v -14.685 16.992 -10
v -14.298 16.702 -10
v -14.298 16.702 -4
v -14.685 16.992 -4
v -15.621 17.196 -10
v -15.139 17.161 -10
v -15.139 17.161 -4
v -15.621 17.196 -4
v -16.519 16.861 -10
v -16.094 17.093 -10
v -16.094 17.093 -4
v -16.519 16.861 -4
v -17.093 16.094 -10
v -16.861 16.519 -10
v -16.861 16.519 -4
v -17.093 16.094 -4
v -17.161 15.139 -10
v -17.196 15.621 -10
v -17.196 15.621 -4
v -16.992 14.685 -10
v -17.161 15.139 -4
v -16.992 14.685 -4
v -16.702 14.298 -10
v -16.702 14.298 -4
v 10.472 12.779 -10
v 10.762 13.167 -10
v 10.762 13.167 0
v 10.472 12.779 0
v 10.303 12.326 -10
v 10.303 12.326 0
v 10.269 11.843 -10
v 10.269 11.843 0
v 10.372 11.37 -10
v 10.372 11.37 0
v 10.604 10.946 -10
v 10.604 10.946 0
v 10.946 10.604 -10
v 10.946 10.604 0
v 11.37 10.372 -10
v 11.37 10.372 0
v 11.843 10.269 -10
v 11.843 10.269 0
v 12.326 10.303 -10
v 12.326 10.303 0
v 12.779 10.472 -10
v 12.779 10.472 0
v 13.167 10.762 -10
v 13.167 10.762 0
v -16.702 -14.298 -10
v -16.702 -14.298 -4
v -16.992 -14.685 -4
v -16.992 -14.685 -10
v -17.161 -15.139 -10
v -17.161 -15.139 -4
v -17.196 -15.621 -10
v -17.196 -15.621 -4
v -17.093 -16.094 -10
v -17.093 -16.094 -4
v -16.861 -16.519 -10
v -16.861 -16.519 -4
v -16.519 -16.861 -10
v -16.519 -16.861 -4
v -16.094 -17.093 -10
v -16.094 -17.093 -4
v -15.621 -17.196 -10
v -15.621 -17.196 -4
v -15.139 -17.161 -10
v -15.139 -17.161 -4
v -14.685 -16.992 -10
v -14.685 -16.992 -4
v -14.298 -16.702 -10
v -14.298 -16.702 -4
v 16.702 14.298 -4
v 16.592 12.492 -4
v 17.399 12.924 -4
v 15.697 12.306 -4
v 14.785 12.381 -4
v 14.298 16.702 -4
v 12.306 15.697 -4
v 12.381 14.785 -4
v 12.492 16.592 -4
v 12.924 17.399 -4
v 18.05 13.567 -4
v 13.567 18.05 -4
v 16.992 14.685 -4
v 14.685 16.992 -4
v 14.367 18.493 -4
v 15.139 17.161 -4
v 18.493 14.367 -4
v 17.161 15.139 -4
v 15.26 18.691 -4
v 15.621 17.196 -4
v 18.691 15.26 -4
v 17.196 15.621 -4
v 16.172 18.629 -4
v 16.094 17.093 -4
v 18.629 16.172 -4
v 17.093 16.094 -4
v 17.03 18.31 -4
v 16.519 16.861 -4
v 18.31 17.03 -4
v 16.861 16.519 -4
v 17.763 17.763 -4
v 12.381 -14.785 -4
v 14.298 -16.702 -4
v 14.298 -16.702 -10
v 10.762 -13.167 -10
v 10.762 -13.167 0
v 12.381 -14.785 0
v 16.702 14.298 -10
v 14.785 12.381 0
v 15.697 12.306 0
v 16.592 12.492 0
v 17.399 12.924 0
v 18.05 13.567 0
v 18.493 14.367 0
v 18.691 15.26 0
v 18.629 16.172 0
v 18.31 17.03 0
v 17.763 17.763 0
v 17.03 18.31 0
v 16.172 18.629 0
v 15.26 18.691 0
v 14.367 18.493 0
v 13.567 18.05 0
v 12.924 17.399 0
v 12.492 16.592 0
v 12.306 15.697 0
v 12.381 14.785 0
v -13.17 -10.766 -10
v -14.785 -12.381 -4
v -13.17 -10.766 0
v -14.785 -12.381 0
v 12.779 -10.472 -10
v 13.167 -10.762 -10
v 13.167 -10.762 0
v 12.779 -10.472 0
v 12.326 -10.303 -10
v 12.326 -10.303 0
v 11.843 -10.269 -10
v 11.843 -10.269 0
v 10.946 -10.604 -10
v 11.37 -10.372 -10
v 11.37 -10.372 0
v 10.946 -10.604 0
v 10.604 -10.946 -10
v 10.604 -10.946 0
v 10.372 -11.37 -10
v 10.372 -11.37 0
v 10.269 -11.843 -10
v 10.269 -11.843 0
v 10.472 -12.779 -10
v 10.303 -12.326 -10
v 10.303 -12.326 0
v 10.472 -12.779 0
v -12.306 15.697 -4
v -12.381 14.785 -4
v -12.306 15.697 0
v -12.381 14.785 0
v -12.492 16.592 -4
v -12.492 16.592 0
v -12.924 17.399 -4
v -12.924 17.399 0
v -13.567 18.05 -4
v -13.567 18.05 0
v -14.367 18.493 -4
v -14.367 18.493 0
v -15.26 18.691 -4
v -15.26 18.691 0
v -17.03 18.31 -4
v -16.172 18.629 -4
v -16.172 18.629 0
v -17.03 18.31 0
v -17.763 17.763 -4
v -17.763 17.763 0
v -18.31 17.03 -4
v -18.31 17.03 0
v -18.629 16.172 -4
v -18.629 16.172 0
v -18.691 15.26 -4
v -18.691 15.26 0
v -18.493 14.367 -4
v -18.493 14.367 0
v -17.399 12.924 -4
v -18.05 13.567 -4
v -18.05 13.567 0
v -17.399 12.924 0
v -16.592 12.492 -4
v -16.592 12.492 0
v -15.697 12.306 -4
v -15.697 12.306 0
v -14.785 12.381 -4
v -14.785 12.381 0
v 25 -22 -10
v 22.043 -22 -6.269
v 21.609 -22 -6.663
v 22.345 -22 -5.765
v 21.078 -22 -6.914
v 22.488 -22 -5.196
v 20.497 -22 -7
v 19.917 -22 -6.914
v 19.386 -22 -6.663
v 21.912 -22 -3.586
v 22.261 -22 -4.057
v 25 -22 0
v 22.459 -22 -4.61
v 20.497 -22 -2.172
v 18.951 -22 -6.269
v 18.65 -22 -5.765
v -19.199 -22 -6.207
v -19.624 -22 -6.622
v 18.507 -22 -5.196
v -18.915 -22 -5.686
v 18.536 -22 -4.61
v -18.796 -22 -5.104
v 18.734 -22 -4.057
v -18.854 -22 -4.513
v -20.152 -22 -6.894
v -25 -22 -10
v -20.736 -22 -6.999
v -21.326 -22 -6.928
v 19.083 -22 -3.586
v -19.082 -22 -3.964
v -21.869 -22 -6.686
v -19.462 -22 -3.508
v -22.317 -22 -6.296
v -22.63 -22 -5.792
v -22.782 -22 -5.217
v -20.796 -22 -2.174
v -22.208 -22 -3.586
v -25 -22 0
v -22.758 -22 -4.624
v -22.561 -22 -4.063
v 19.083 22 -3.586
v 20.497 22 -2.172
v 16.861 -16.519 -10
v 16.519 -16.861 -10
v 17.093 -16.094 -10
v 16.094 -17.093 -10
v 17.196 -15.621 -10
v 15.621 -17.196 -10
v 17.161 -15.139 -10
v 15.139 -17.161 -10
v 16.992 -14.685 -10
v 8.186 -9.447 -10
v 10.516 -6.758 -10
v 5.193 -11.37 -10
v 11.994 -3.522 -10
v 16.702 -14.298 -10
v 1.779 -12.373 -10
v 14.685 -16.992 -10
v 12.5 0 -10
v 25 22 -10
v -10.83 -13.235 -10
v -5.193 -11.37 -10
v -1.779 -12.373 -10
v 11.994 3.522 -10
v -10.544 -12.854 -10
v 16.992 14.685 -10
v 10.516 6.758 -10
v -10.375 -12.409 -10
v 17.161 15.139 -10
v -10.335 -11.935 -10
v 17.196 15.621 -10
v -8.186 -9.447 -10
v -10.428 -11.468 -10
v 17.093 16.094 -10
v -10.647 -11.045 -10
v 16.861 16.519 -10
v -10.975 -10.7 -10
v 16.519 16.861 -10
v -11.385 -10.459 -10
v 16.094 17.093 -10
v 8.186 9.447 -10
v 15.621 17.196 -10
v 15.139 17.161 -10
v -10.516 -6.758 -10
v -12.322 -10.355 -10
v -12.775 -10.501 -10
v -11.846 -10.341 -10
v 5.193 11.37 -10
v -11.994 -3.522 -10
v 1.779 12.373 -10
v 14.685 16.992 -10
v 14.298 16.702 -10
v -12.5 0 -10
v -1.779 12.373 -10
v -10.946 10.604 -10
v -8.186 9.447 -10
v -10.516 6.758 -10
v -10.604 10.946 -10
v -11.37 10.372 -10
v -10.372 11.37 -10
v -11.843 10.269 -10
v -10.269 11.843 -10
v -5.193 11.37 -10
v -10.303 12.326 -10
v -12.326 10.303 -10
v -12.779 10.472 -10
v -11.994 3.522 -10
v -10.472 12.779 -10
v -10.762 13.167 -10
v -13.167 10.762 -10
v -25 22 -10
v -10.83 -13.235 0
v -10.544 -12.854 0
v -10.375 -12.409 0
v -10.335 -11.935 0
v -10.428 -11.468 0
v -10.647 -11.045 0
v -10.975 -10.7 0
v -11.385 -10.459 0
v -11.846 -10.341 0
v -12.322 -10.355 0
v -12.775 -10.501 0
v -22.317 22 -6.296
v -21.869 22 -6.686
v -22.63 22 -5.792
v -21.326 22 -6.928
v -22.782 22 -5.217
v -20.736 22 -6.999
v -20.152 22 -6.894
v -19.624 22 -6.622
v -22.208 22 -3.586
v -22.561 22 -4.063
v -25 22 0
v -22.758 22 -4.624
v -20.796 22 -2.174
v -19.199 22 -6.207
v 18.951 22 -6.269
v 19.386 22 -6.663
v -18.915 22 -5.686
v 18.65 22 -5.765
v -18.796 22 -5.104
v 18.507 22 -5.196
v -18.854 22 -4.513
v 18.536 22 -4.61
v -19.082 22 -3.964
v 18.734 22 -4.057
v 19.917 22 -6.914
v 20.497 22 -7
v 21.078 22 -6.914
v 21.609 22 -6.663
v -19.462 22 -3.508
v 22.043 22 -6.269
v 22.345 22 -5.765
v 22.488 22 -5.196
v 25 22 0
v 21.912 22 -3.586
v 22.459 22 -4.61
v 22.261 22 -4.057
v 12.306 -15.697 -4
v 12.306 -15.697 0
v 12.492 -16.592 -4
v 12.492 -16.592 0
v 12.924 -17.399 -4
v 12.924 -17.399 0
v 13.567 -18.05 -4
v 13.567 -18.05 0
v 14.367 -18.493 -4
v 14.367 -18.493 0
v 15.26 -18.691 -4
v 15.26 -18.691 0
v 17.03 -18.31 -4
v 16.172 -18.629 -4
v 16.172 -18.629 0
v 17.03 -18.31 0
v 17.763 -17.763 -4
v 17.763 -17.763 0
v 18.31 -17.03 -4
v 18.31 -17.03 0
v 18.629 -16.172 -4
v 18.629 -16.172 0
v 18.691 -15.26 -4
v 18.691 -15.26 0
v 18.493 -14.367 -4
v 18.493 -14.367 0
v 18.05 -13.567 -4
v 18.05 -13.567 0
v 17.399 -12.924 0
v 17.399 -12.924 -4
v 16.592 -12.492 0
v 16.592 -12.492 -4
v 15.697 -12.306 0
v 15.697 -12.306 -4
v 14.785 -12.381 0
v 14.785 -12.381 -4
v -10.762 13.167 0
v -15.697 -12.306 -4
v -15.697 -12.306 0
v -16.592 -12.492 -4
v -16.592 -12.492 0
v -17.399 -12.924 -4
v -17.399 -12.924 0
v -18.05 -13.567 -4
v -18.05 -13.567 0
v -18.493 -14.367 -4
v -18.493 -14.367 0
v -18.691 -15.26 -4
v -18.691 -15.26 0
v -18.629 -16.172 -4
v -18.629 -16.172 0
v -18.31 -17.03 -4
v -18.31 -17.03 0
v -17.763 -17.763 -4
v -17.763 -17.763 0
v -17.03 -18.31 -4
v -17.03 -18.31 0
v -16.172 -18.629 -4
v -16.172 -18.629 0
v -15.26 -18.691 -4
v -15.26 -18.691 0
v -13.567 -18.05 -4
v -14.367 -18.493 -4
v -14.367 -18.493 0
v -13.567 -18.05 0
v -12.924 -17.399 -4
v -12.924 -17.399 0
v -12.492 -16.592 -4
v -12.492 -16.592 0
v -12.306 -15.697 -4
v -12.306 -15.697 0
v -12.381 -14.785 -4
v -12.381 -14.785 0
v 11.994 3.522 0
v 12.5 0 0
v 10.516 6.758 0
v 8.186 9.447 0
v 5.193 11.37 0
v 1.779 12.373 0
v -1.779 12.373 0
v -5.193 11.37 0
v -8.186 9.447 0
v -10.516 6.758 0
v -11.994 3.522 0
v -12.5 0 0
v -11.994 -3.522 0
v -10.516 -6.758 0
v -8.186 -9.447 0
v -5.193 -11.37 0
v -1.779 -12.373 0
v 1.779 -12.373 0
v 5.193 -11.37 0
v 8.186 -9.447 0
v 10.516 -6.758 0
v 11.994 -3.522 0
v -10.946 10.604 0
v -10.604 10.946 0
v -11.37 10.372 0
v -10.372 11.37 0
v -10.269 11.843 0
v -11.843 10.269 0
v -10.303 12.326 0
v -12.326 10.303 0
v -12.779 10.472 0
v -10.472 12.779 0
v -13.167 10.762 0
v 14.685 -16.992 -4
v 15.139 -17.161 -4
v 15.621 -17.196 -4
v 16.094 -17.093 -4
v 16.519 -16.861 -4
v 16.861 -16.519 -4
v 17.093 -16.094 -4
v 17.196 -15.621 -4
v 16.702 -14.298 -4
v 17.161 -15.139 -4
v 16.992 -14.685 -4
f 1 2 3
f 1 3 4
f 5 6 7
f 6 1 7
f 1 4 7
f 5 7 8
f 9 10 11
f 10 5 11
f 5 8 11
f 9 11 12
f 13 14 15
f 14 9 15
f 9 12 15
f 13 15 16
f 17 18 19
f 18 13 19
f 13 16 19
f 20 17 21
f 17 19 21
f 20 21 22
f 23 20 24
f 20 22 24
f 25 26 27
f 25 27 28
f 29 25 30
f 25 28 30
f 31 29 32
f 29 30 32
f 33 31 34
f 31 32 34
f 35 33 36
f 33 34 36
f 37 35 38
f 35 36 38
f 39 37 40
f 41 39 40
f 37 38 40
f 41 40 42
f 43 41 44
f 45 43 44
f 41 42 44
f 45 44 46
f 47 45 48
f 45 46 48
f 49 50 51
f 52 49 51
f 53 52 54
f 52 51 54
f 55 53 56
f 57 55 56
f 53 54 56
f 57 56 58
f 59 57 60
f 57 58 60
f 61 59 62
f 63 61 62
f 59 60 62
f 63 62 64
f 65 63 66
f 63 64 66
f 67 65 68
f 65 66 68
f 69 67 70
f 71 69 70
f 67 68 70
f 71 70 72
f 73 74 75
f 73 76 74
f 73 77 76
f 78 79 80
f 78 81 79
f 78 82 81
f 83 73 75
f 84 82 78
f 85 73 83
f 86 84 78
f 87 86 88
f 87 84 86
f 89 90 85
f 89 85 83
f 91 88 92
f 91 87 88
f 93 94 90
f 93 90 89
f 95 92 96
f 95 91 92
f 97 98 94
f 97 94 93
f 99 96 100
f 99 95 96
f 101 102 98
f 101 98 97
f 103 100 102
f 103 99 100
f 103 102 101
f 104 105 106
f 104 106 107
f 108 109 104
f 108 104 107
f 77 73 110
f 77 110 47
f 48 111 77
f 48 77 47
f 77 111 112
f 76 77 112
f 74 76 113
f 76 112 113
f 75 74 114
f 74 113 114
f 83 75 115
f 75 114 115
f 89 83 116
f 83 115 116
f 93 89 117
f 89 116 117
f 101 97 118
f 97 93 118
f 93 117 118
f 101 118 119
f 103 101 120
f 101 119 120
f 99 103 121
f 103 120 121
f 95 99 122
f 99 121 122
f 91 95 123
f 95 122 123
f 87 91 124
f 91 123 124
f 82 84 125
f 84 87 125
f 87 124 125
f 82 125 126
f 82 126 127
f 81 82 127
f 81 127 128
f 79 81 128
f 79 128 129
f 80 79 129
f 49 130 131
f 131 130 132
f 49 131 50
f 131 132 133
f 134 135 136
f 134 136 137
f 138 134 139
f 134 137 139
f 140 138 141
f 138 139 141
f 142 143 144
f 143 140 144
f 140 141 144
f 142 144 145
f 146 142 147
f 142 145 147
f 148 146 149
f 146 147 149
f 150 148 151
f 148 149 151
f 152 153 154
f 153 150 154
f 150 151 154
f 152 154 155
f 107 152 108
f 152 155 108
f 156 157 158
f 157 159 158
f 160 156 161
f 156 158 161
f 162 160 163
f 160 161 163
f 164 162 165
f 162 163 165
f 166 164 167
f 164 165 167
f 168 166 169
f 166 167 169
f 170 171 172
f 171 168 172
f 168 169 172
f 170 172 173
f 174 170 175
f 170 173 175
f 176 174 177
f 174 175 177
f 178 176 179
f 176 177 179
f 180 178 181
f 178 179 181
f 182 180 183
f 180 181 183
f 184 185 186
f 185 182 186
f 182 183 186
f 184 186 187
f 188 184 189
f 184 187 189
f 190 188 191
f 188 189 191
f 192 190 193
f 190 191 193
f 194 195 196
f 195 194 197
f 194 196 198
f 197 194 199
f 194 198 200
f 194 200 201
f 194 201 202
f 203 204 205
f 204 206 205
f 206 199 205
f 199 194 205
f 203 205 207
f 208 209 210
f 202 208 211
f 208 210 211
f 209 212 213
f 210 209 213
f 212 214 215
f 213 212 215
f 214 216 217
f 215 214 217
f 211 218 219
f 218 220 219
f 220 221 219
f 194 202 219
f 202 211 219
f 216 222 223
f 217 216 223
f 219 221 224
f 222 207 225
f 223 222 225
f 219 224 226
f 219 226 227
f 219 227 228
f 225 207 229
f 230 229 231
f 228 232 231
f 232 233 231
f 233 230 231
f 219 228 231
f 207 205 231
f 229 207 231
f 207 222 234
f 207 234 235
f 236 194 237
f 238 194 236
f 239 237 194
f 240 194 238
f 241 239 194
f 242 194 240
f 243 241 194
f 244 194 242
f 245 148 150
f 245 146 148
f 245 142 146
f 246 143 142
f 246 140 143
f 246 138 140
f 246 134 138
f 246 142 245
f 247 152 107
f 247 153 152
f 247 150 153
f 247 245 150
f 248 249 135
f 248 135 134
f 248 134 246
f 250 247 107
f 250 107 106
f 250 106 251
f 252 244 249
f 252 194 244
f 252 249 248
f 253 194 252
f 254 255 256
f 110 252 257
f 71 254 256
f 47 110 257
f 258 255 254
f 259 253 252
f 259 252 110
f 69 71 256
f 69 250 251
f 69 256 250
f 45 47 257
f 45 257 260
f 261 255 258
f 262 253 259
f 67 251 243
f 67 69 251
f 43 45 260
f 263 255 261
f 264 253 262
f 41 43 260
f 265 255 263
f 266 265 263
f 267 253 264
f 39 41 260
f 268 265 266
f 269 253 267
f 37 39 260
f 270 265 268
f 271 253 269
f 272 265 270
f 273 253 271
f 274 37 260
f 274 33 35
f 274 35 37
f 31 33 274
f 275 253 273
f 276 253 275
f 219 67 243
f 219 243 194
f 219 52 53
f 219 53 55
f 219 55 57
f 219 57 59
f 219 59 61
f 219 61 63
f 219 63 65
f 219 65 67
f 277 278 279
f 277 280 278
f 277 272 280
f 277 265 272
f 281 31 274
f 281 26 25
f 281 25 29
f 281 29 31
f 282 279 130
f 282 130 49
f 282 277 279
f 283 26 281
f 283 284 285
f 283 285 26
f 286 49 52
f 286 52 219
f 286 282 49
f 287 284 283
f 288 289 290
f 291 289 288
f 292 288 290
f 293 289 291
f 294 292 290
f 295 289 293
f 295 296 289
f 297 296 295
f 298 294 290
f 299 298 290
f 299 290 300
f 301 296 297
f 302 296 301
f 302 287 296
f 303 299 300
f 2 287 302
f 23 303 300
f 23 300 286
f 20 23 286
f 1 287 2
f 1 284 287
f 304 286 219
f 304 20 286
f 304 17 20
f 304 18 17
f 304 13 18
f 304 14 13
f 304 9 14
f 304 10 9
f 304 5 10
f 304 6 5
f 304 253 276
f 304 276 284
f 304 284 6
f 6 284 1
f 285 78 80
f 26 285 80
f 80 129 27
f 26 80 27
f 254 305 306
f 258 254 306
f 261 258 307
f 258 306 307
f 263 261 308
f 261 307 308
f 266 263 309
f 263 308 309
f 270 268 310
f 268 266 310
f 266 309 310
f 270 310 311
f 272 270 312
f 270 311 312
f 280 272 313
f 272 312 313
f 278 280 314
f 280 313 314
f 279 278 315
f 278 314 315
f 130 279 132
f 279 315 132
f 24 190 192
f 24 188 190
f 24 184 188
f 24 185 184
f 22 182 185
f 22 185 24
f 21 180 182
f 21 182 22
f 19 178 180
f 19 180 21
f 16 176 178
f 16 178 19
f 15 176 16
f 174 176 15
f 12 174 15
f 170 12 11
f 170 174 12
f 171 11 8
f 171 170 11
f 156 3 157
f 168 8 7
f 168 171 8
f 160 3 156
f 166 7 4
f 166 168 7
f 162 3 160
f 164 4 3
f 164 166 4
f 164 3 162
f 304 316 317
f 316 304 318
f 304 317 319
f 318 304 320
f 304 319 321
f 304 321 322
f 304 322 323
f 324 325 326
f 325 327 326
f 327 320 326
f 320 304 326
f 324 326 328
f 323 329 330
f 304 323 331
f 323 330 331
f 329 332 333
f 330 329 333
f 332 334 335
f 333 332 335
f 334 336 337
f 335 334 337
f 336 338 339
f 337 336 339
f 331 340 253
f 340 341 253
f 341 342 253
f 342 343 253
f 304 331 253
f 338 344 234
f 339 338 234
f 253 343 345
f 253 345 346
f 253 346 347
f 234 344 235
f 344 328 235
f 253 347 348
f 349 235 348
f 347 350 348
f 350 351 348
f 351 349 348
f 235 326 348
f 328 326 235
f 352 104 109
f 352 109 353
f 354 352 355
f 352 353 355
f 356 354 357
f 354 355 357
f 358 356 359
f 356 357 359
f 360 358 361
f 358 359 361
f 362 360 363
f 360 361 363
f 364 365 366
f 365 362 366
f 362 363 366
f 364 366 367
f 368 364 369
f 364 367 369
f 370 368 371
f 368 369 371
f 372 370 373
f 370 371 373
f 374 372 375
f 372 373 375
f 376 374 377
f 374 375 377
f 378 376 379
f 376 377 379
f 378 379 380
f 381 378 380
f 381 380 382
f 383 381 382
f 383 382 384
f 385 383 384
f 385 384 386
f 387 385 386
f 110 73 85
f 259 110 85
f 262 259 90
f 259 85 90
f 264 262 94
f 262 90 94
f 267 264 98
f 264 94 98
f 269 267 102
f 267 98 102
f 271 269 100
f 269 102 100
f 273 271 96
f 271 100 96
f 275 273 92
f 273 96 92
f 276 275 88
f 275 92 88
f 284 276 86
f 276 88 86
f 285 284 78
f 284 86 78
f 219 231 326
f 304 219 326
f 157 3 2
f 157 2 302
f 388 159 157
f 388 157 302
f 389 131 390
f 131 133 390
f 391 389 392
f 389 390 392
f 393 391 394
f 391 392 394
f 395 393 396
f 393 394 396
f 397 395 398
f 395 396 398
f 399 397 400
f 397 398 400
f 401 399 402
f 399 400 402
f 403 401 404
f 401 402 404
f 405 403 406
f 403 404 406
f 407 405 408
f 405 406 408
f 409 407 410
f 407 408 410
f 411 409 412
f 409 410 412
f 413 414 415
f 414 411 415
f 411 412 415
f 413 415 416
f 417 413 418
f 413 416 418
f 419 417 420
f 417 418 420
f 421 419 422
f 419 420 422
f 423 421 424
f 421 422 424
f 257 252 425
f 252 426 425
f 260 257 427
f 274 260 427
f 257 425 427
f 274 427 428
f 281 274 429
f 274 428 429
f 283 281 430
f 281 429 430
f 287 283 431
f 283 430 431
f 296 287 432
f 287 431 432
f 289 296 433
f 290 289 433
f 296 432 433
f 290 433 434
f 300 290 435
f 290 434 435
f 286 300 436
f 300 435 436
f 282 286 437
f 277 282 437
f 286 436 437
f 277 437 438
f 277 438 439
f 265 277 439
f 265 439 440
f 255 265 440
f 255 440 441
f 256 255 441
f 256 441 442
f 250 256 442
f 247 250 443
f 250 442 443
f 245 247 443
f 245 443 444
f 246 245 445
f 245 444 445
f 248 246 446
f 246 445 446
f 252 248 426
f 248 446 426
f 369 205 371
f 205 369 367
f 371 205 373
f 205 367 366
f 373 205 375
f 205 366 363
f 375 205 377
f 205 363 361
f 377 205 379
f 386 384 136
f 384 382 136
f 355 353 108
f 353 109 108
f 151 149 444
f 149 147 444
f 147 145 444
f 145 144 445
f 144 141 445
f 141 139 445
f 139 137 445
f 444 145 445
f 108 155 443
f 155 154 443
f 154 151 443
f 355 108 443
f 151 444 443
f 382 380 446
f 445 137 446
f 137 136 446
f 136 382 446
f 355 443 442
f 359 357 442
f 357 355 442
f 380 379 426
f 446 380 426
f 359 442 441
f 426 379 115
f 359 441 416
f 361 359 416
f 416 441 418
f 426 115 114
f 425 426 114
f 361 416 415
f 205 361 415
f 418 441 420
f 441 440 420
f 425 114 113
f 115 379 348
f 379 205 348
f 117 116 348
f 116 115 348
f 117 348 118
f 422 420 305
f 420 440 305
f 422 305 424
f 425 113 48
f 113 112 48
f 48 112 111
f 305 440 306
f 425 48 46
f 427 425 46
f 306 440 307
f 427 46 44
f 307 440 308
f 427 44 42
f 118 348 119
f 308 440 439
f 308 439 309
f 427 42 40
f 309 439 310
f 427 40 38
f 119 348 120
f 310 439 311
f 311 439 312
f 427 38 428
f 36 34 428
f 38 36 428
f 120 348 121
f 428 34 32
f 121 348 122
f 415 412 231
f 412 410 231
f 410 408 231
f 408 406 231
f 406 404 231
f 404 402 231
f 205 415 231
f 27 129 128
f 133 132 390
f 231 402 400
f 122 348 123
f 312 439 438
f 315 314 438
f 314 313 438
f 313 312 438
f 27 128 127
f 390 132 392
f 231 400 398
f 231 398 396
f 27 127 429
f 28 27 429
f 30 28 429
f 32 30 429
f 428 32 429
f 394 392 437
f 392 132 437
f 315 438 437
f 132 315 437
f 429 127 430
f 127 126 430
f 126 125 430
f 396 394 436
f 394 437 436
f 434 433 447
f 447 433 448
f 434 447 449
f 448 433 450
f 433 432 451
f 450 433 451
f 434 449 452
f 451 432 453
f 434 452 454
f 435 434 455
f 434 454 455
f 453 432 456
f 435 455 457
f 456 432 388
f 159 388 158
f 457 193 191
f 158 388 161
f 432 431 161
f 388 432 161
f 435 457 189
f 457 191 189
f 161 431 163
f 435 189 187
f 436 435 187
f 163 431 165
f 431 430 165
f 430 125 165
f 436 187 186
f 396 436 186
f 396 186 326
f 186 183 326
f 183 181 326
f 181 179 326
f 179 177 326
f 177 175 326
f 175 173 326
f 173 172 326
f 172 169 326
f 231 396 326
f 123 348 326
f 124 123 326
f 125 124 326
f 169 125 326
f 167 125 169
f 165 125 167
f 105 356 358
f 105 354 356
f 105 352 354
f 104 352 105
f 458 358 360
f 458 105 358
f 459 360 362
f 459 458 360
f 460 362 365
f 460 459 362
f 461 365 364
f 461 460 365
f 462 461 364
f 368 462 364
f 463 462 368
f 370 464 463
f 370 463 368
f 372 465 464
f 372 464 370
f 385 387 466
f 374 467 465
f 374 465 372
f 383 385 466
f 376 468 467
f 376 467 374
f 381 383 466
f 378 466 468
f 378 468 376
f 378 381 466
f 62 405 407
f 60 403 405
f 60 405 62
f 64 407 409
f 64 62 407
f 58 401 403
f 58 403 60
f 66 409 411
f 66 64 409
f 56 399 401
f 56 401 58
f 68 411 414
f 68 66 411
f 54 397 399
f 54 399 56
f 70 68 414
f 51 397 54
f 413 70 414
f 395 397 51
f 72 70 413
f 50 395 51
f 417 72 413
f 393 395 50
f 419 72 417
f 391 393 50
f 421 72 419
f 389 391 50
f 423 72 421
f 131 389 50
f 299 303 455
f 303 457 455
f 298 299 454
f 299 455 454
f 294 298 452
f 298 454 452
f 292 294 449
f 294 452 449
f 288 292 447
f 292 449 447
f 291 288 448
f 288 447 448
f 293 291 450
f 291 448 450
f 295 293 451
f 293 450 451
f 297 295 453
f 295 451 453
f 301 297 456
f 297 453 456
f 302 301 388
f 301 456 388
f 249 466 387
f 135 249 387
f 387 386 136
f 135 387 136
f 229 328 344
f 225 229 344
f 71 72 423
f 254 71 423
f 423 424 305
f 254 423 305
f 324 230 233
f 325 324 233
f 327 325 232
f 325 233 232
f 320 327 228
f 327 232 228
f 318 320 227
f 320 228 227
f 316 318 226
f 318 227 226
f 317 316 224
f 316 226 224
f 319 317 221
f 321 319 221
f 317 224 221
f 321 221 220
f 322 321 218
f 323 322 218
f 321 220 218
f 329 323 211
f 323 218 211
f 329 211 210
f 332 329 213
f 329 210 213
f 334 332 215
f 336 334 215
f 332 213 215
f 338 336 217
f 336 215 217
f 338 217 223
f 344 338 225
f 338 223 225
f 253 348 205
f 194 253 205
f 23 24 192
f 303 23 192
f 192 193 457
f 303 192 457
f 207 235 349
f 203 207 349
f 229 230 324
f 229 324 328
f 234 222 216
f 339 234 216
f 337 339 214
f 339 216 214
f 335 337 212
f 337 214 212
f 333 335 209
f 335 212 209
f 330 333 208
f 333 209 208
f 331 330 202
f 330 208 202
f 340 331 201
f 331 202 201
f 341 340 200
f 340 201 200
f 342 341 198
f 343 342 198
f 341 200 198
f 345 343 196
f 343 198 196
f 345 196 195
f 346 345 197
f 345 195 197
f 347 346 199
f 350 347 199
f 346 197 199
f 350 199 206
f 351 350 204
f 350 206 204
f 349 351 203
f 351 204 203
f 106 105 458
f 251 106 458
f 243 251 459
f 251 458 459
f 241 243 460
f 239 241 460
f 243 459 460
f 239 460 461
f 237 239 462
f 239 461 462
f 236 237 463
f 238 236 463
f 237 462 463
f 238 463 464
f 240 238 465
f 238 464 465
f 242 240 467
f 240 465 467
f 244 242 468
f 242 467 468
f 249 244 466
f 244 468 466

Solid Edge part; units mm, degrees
sketch "Sketch1" plane through (0, 0, 0) normal (0, 0, 1) x (1, 0, 0)
  line L0 (-25, 22) -> (25, 22)
  line L1 (25, 22) -> (25, -22)
  line L2 (25, -22) -> (-25, -22)
  line L3 (-25, -22) -> (-25, 22)
  line L4 (-14.2979, 16.7021) -> (-10.7624, 13.1665)
  arc A0 (-13.1665, 10.7624) -> (-10.7624, 13.1665) centre (-11.9645, 11.9645) ccw
  line L5 (-16.7021, 14.2979) -> (-13.1665, 10.7624)
  arc A1 (-16.7021, 14.2979) -> (-14.2979, 16.7021) centre (-15.5, 15.5) cw
  line L6 (14.2979, 16.7021) -> (10.7624, 13.1665)
  arc A2 (10.7624, 13.1665) -> (13.1665, 10.7624) centre (11.9645, 11.9645) ccw
  line L7 (16.7021, 14.2979) -> (13.1665, 10.7624)
  arc A3 (16.7021, 14.2979) -> (14.2979, 16.7021) centre (15.5, 15.5) ccw
  line L8 (16.7021, -14.2979) -> (13.1665, -10.7624)
  arc A4 (10.7624, -13.1665) -> (13.1665, -10.7624) centre (11.9645, -11.9645) cw
  line L9 (14.2979, -16.7021) -> (10.7624, -13.1665)
  arc A5 (14.2979, -16.7021) -> (16.7021, -14.2979) centre (15.5, -15.5) ccw
  line L10 (-14.2979, -16.7021) -> (-10.8303, -13.2345)
  arc A6 (-13.1705, -10.7663) -> (-10.8303, -13.2345) centre (-12.0333, -12.0316) cw
  line L11 (-13.1705, -10.7663) -> (-16.7021, -14.2979)
  arc A7 (-16.7021, -14.2979) -> (-14.2979, -16.7021) centre (-15.5, -15.5) ccw
  circle A8 centre (0, 0) radius 12.5
  dimension "D1" = 44
  dimension "D2" = 50
  dimension "D3" = 25
  dimension "D4" = 22
  dimension "D5" = 25
extrude "Protrusion1" add sketch "Sketch1" against normal blind 10
sketch "Sketch2" plane through (0, 0, 0) normal (0, 0, 1) x (0, -1, 0)
  circle A0 centre (-15.5, 15.5) radius 3.2
  circle A1 centre (15.5, 15.5) radius 3.2
  circle A2 centre (15.5, -15.5) radius 3.2
  circle A3 centre (-15.5, -15.5) radius 3.2
extrude "ExtrudedCutout_1" cut sketch "Sketch2" against normal blind 4
sketch "Sketch3" plane through (0, -22, -3.5) normal (0, -1, 0) x (1, 0, 0)
  line L0 (19.0832, -0.0858) -> (20.4974, 1.3284)
  line L1 (20.4974, 1.3284) -> (21.9116, -0.0858)
  arc A0 (21.9116, -0.0858) -> (19.0832, -0.0858) centre (20.4974, -1.5) cw
  line L2 (-22.2076, -0.0858) -> (-20.7957, 1.3261)
  line L3 (-20.7957, 1.3261) -> (-19.462, -0.0076)
  arc A1 (-19.462, -0.0076) -> (-22.2076, -0.0858) centre (-20.7934, -1.5) cw
  dimension "D1" = 5
extrude "ExtrudedCutout_2" cut sketch "Sketch3" against normal blind 168.7822
